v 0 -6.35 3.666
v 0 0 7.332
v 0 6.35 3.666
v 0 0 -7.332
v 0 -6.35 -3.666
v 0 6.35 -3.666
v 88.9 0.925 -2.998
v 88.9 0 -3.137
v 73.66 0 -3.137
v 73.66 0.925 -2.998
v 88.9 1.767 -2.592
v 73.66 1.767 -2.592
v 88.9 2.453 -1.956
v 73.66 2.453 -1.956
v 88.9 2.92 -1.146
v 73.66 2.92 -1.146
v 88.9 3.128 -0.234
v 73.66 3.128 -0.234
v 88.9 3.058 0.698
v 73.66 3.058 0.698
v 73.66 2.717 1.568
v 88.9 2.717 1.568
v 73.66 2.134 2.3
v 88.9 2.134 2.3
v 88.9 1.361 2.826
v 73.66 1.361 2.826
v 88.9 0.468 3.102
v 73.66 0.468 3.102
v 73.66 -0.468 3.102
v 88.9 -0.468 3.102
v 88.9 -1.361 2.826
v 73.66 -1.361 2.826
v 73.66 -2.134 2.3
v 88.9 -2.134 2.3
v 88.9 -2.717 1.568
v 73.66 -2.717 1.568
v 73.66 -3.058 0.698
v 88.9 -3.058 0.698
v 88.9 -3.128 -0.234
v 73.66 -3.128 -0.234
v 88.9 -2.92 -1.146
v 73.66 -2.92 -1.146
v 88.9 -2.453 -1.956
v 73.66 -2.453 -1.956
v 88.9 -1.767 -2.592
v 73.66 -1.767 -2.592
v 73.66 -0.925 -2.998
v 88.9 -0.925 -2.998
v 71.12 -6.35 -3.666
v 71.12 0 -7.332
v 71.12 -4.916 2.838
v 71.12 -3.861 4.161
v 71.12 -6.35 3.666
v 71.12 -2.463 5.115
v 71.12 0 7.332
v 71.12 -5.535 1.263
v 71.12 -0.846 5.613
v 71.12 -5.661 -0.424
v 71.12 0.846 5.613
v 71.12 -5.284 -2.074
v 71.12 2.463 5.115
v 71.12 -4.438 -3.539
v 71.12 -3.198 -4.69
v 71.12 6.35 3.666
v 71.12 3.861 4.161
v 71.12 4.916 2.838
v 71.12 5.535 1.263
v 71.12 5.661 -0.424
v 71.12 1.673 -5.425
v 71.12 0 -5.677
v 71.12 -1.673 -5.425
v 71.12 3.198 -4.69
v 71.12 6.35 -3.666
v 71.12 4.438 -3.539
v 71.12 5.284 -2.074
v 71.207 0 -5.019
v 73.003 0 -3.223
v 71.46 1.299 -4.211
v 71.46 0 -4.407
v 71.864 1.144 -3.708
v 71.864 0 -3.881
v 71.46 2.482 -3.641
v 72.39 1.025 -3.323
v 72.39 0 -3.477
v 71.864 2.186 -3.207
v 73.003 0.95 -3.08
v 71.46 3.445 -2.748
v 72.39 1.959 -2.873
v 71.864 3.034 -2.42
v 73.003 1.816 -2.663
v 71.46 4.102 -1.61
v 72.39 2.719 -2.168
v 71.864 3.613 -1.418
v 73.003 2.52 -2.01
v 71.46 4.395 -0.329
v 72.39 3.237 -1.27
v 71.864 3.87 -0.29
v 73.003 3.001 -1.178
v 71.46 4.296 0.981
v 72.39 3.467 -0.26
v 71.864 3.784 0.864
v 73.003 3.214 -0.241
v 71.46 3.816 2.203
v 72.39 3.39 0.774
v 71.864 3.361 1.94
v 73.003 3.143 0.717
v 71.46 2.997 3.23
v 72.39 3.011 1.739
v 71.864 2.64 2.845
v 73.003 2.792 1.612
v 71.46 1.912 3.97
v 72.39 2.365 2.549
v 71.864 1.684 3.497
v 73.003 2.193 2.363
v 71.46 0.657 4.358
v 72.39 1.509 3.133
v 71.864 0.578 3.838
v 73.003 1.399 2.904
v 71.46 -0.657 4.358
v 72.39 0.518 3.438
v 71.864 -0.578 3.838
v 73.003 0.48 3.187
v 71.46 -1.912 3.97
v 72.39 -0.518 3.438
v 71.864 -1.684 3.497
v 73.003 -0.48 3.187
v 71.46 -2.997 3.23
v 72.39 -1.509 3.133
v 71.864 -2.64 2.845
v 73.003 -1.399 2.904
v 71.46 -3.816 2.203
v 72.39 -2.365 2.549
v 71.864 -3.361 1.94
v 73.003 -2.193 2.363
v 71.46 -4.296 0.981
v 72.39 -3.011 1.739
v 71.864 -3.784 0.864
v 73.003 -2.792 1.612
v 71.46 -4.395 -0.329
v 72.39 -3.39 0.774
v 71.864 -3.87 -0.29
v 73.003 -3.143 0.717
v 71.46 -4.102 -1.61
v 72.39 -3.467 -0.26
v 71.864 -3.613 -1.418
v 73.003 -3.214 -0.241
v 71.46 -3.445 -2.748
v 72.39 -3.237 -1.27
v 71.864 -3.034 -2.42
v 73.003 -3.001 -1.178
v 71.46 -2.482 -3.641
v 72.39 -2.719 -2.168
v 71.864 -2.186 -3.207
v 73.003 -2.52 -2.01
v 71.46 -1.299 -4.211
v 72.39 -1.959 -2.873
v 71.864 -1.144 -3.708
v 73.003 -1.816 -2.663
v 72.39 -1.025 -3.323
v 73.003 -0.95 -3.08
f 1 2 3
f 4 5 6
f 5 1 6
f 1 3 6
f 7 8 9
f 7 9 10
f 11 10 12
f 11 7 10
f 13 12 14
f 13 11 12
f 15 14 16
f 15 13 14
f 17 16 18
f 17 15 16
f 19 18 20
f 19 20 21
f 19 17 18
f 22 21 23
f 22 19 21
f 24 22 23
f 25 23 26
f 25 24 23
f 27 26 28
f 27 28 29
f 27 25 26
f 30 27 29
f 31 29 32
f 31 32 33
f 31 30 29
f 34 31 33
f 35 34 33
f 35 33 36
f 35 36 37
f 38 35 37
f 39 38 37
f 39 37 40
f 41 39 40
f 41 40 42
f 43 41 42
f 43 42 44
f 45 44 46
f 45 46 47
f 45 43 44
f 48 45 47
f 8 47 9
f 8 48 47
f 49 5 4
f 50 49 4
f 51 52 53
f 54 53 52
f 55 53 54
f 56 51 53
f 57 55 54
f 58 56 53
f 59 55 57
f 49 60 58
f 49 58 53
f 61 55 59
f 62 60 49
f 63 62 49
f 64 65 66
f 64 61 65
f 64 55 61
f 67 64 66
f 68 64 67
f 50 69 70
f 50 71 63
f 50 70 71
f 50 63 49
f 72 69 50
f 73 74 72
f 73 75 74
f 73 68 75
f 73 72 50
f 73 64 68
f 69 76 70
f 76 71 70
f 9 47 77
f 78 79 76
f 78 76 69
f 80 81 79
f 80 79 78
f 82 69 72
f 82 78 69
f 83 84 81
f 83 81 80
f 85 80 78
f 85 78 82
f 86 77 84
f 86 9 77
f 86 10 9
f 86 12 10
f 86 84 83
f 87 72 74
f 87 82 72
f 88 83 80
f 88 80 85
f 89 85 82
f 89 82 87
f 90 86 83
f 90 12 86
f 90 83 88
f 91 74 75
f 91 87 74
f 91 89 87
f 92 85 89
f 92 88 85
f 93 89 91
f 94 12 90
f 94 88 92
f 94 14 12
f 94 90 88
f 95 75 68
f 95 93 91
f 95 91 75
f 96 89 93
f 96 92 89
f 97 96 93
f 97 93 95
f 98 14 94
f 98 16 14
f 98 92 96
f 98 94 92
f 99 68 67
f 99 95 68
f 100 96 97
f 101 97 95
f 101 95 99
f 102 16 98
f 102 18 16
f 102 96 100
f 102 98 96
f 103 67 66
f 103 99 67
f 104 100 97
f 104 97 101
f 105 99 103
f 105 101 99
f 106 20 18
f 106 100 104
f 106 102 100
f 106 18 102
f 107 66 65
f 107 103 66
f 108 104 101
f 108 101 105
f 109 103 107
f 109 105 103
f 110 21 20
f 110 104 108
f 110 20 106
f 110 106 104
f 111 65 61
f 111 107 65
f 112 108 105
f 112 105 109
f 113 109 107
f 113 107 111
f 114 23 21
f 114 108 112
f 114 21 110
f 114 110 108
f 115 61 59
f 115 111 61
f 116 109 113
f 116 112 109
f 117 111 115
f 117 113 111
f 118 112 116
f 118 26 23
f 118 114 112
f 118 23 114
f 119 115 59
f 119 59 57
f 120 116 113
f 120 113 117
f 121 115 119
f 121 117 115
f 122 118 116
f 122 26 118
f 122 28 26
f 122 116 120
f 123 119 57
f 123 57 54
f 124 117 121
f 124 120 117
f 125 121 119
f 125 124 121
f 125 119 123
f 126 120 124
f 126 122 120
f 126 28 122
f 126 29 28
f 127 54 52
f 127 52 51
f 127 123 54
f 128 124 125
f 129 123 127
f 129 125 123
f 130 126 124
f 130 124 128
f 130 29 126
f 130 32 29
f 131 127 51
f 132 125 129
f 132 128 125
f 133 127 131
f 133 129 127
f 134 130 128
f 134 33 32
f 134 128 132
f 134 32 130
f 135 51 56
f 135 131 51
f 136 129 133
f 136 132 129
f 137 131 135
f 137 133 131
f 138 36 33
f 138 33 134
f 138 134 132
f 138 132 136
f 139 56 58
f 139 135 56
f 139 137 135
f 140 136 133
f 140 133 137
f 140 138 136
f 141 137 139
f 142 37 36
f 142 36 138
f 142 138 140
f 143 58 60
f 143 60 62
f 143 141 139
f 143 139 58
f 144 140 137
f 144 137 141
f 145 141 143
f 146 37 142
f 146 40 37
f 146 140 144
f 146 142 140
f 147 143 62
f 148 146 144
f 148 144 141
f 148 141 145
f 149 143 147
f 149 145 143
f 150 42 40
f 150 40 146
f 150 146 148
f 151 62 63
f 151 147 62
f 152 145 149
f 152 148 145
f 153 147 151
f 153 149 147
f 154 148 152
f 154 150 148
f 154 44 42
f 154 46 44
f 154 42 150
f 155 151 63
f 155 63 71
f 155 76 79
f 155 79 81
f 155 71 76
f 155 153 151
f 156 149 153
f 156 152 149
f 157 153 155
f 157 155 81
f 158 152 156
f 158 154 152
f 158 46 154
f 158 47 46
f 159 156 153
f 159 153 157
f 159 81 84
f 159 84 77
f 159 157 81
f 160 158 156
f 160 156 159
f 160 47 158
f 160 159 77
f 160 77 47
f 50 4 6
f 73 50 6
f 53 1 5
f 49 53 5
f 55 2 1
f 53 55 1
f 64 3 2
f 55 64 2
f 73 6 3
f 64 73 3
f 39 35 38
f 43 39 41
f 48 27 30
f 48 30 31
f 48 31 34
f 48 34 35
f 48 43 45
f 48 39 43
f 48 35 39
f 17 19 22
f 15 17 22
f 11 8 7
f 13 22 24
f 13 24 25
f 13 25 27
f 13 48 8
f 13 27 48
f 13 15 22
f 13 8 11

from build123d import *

# Parameters (mm, degrees)
BOSS_EXTRUDE1_DEPTH = 88.9
SKETCH2_R           = 9.399520033
SKETCH2_R_2         = 3.1369
CUT_EXTRUDE1_DEPTH  = 17.78
FILLET1_R           = 2.54


with BuildPart() as part:
    # Sketch1 → Boss-Extrude1 (new body)
    with BuildSketch(Plane(origin=(0, 0, 0), x_dir=(0, 0, -1), z_dir=(1, 0, 0))):
        Polygon((3.666174209, -6.35), (7.332348419, 0), (3.666174209, 6.35), (-3.666174209, 6.35), (-7.332348419, 0), (-3.666174209, -6.35), align=None)
    extrude(amount=BOSS_EXTRUDE1_DEPTH)

    # Sketch2 → Cut-Extrude1 (cut)
    with BuildSketch(Plane(origin=(88.9, 0, 0), x_dir=(0, 0, -1), z_dir=(1, 0, 0))):
        Circle(SKETCH2_R)
        Circle(SKETCH2_R_2, mode=Mode.SUBTRACT)
    extrude(amount=-CUT_EXTRUDE1_DEPTH, mode=Mode.SUBTRACT)

    # Fillet1
    fillet1_edges = [part.edges().sort_by_distance(p)[0] for p in [
        (71.12, 0, 3.1369),
    ]]
    fillet(fillet1_edges, radius=FILLET1_R)


solid = part.part
